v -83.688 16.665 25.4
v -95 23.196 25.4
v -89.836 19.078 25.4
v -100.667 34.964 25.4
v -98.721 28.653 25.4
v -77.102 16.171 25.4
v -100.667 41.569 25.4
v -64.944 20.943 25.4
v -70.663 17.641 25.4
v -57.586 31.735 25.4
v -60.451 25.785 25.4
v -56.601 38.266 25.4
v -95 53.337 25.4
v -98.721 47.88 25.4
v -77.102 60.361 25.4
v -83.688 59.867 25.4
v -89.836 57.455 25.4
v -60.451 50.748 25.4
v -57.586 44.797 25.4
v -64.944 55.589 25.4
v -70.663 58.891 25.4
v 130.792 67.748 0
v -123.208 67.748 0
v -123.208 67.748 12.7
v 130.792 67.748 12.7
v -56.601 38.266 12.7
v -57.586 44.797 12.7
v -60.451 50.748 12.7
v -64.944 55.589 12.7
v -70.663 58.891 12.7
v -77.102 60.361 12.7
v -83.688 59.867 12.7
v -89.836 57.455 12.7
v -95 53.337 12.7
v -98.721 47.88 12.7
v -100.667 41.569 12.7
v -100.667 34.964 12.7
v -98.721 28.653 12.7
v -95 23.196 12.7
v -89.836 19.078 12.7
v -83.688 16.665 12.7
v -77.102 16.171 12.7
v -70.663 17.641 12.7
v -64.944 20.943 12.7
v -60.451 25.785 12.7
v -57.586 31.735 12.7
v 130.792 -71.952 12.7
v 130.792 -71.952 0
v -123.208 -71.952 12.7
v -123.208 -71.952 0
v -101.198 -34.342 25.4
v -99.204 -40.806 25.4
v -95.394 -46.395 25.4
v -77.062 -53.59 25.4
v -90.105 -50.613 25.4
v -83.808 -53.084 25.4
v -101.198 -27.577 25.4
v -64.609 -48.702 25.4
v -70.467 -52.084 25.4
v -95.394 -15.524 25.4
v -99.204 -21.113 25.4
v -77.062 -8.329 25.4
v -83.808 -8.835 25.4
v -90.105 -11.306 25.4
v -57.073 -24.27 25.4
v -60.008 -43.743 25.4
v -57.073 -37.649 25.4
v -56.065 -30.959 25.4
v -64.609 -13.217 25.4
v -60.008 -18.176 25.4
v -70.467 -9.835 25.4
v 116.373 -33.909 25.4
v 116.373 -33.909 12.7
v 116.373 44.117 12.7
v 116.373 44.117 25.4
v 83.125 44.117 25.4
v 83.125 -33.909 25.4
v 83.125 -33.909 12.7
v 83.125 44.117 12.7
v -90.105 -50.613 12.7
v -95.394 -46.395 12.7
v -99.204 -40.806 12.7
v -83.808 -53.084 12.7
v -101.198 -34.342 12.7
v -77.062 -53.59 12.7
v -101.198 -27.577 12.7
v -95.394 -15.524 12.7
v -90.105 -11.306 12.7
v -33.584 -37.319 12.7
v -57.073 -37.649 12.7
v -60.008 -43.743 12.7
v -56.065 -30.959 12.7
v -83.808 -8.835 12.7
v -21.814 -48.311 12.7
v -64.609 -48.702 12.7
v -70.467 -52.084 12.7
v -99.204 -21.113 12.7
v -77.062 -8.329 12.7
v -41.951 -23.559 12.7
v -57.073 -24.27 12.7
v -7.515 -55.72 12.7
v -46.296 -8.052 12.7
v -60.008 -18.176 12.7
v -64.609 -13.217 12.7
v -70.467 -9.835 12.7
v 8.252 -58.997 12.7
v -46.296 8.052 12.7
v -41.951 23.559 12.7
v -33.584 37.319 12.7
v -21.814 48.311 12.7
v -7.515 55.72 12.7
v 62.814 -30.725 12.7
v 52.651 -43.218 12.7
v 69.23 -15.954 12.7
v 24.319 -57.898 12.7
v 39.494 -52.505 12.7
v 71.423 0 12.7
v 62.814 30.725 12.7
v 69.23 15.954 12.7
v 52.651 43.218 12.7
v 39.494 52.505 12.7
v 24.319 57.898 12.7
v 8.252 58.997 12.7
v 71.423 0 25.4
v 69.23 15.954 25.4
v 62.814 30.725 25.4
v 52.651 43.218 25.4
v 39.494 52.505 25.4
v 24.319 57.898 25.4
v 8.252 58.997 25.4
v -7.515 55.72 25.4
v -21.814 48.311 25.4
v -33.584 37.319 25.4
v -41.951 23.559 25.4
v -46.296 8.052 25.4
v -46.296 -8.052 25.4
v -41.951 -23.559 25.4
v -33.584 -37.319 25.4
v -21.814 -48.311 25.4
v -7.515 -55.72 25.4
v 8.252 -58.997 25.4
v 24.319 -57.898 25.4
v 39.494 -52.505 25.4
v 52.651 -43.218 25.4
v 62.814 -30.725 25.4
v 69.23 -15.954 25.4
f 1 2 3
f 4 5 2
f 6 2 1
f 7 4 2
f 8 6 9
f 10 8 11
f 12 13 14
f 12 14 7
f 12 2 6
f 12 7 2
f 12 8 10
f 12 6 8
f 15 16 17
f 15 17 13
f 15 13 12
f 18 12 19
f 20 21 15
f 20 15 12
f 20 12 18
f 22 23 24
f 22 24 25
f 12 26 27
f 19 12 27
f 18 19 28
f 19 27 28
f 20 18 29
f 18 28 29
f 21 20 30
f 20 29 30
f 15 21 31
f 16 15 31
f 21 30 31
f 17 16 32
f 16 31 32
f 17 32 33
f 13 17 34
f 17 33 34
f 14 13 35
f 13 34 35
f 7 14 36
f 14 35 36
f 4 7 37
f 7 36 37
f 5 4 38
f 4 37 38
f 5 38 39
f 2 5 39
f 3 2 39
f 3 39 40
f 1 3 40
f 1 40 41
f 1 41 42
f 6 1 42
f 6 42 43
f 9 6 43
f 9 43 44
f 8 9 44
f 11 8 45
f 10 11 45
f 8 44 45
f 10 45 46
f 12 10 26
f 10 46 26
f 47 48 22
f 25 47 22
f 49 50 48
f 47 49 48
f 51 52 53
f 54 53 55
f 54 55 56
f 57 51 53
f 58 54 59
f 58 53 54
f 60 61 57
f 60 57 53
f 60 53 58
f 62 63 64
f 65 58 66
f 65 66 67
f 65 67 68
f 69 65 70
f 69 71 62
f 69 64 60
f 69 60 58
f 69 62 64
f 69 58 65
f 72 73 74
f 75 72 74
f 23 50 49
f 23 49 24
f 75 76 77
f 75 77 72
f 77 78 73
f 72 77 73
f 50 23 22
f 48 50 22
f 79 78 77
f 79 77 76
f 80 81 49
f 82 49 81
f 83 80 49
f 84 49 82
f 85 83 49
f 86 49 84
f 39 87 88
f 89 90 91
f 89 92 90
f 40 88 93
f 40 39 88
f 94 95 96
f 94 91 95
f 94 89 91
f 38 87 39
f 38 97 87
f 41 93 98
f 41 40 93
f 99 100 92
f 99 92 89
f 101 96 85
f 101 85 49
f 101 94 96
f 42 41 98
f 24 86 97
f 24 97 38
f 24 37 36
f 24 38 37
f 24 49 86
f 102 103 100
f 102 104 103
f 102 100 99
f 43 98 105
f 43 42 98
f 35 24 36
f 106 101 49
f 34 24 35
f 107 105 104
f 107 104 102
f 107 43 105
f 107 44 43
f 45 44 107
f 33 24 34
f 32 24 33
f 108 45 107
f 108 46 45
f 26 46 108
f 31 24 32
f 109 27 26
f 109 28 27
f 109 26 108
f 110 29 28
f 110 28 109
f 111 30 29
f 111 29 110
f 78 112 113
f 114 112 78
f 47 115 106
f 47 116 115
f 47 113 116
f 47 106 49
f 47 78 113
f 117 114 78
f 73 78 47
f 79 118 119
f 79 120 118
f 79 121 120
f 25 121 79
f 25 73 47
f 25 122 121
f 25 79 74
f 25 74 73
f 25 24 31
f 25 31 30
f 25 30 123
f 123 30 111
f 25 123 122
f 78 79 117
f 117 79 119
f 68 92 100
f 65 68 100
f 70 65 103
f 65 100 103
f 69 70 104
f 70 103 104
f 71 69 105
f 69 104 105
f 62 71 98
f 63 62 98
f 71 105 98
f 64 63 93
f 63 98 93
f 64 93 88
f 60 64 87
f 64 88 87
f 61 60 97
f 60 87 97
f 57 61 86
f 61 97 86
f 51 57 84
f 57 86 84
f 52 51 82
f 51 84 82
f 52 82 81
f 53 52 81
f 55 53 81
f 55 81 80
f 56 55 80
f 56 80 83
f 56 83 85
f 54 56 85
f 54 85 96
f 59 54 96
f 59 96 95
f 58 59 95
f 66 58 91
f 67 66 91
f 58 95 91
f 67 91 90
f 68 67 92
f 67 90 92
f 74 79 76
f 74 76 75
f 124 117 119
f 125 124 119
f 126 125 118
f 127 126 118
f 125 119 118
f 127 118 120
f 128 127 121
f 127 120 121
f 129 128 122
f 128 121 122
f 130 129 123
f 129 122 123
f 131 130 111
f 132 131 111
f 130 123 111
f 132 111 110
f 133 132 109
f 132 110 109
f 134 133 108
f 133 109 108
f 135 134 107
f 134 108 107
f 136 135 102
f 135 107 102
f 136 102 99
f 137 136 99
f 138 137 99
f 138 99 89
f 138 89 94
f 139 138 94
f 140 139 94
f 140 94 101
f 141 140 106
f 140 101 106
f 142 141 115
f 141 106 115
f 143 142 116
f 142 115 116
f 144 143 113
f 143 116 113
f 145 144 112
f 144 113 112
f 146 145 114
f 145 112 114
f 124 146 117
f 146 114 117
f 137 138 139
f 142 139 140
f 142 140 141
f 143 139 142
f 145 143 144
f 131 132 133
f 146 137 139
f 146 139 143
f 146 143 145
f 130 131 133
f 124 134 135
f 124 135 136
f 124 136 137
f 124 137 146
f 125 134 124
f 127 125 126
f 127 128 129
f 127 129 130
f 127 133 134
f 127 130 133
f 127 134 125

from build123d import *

# Parameters (mm, degrees)
F0_W     = 254
F0_H     = 139.7
F1_DEPTH = 12.7
F2_R     = 22.156791
F2_R_2   = 22.69355
F2_R_3   = 59.134775
F2_W     = 33.248223
F2_H     = 78.026086
F3_DEPTH = 12.7


with BuildPart() as f1:
    # F0 (on Top) → F1 (new body)
    with BuildSketch(Plane.XY):
        with Locations((3.791939, -2.102413)):
            Rectangle(F0_W, F0_H)
    extrude(amount=F1_DEPTH)

    # F2 (on face) → F3 (join)
    with BuildSketch(Plane.XY.offset(12.7)):
        with Locations((-78.758061, 38.266217)):
            Circle(F2_R)
        with Locations((-78.758061, -30.959498)):
            Circle(F2_R_2)
        with Locations((12.287973, 0)):
            Circle(F2_R_3)
        with Locations((99.749218, 5.104106)):
            Rectangle(F2_W, F2_H)
    extrude(amount=F3_DEPTH)


solid = f1.part
